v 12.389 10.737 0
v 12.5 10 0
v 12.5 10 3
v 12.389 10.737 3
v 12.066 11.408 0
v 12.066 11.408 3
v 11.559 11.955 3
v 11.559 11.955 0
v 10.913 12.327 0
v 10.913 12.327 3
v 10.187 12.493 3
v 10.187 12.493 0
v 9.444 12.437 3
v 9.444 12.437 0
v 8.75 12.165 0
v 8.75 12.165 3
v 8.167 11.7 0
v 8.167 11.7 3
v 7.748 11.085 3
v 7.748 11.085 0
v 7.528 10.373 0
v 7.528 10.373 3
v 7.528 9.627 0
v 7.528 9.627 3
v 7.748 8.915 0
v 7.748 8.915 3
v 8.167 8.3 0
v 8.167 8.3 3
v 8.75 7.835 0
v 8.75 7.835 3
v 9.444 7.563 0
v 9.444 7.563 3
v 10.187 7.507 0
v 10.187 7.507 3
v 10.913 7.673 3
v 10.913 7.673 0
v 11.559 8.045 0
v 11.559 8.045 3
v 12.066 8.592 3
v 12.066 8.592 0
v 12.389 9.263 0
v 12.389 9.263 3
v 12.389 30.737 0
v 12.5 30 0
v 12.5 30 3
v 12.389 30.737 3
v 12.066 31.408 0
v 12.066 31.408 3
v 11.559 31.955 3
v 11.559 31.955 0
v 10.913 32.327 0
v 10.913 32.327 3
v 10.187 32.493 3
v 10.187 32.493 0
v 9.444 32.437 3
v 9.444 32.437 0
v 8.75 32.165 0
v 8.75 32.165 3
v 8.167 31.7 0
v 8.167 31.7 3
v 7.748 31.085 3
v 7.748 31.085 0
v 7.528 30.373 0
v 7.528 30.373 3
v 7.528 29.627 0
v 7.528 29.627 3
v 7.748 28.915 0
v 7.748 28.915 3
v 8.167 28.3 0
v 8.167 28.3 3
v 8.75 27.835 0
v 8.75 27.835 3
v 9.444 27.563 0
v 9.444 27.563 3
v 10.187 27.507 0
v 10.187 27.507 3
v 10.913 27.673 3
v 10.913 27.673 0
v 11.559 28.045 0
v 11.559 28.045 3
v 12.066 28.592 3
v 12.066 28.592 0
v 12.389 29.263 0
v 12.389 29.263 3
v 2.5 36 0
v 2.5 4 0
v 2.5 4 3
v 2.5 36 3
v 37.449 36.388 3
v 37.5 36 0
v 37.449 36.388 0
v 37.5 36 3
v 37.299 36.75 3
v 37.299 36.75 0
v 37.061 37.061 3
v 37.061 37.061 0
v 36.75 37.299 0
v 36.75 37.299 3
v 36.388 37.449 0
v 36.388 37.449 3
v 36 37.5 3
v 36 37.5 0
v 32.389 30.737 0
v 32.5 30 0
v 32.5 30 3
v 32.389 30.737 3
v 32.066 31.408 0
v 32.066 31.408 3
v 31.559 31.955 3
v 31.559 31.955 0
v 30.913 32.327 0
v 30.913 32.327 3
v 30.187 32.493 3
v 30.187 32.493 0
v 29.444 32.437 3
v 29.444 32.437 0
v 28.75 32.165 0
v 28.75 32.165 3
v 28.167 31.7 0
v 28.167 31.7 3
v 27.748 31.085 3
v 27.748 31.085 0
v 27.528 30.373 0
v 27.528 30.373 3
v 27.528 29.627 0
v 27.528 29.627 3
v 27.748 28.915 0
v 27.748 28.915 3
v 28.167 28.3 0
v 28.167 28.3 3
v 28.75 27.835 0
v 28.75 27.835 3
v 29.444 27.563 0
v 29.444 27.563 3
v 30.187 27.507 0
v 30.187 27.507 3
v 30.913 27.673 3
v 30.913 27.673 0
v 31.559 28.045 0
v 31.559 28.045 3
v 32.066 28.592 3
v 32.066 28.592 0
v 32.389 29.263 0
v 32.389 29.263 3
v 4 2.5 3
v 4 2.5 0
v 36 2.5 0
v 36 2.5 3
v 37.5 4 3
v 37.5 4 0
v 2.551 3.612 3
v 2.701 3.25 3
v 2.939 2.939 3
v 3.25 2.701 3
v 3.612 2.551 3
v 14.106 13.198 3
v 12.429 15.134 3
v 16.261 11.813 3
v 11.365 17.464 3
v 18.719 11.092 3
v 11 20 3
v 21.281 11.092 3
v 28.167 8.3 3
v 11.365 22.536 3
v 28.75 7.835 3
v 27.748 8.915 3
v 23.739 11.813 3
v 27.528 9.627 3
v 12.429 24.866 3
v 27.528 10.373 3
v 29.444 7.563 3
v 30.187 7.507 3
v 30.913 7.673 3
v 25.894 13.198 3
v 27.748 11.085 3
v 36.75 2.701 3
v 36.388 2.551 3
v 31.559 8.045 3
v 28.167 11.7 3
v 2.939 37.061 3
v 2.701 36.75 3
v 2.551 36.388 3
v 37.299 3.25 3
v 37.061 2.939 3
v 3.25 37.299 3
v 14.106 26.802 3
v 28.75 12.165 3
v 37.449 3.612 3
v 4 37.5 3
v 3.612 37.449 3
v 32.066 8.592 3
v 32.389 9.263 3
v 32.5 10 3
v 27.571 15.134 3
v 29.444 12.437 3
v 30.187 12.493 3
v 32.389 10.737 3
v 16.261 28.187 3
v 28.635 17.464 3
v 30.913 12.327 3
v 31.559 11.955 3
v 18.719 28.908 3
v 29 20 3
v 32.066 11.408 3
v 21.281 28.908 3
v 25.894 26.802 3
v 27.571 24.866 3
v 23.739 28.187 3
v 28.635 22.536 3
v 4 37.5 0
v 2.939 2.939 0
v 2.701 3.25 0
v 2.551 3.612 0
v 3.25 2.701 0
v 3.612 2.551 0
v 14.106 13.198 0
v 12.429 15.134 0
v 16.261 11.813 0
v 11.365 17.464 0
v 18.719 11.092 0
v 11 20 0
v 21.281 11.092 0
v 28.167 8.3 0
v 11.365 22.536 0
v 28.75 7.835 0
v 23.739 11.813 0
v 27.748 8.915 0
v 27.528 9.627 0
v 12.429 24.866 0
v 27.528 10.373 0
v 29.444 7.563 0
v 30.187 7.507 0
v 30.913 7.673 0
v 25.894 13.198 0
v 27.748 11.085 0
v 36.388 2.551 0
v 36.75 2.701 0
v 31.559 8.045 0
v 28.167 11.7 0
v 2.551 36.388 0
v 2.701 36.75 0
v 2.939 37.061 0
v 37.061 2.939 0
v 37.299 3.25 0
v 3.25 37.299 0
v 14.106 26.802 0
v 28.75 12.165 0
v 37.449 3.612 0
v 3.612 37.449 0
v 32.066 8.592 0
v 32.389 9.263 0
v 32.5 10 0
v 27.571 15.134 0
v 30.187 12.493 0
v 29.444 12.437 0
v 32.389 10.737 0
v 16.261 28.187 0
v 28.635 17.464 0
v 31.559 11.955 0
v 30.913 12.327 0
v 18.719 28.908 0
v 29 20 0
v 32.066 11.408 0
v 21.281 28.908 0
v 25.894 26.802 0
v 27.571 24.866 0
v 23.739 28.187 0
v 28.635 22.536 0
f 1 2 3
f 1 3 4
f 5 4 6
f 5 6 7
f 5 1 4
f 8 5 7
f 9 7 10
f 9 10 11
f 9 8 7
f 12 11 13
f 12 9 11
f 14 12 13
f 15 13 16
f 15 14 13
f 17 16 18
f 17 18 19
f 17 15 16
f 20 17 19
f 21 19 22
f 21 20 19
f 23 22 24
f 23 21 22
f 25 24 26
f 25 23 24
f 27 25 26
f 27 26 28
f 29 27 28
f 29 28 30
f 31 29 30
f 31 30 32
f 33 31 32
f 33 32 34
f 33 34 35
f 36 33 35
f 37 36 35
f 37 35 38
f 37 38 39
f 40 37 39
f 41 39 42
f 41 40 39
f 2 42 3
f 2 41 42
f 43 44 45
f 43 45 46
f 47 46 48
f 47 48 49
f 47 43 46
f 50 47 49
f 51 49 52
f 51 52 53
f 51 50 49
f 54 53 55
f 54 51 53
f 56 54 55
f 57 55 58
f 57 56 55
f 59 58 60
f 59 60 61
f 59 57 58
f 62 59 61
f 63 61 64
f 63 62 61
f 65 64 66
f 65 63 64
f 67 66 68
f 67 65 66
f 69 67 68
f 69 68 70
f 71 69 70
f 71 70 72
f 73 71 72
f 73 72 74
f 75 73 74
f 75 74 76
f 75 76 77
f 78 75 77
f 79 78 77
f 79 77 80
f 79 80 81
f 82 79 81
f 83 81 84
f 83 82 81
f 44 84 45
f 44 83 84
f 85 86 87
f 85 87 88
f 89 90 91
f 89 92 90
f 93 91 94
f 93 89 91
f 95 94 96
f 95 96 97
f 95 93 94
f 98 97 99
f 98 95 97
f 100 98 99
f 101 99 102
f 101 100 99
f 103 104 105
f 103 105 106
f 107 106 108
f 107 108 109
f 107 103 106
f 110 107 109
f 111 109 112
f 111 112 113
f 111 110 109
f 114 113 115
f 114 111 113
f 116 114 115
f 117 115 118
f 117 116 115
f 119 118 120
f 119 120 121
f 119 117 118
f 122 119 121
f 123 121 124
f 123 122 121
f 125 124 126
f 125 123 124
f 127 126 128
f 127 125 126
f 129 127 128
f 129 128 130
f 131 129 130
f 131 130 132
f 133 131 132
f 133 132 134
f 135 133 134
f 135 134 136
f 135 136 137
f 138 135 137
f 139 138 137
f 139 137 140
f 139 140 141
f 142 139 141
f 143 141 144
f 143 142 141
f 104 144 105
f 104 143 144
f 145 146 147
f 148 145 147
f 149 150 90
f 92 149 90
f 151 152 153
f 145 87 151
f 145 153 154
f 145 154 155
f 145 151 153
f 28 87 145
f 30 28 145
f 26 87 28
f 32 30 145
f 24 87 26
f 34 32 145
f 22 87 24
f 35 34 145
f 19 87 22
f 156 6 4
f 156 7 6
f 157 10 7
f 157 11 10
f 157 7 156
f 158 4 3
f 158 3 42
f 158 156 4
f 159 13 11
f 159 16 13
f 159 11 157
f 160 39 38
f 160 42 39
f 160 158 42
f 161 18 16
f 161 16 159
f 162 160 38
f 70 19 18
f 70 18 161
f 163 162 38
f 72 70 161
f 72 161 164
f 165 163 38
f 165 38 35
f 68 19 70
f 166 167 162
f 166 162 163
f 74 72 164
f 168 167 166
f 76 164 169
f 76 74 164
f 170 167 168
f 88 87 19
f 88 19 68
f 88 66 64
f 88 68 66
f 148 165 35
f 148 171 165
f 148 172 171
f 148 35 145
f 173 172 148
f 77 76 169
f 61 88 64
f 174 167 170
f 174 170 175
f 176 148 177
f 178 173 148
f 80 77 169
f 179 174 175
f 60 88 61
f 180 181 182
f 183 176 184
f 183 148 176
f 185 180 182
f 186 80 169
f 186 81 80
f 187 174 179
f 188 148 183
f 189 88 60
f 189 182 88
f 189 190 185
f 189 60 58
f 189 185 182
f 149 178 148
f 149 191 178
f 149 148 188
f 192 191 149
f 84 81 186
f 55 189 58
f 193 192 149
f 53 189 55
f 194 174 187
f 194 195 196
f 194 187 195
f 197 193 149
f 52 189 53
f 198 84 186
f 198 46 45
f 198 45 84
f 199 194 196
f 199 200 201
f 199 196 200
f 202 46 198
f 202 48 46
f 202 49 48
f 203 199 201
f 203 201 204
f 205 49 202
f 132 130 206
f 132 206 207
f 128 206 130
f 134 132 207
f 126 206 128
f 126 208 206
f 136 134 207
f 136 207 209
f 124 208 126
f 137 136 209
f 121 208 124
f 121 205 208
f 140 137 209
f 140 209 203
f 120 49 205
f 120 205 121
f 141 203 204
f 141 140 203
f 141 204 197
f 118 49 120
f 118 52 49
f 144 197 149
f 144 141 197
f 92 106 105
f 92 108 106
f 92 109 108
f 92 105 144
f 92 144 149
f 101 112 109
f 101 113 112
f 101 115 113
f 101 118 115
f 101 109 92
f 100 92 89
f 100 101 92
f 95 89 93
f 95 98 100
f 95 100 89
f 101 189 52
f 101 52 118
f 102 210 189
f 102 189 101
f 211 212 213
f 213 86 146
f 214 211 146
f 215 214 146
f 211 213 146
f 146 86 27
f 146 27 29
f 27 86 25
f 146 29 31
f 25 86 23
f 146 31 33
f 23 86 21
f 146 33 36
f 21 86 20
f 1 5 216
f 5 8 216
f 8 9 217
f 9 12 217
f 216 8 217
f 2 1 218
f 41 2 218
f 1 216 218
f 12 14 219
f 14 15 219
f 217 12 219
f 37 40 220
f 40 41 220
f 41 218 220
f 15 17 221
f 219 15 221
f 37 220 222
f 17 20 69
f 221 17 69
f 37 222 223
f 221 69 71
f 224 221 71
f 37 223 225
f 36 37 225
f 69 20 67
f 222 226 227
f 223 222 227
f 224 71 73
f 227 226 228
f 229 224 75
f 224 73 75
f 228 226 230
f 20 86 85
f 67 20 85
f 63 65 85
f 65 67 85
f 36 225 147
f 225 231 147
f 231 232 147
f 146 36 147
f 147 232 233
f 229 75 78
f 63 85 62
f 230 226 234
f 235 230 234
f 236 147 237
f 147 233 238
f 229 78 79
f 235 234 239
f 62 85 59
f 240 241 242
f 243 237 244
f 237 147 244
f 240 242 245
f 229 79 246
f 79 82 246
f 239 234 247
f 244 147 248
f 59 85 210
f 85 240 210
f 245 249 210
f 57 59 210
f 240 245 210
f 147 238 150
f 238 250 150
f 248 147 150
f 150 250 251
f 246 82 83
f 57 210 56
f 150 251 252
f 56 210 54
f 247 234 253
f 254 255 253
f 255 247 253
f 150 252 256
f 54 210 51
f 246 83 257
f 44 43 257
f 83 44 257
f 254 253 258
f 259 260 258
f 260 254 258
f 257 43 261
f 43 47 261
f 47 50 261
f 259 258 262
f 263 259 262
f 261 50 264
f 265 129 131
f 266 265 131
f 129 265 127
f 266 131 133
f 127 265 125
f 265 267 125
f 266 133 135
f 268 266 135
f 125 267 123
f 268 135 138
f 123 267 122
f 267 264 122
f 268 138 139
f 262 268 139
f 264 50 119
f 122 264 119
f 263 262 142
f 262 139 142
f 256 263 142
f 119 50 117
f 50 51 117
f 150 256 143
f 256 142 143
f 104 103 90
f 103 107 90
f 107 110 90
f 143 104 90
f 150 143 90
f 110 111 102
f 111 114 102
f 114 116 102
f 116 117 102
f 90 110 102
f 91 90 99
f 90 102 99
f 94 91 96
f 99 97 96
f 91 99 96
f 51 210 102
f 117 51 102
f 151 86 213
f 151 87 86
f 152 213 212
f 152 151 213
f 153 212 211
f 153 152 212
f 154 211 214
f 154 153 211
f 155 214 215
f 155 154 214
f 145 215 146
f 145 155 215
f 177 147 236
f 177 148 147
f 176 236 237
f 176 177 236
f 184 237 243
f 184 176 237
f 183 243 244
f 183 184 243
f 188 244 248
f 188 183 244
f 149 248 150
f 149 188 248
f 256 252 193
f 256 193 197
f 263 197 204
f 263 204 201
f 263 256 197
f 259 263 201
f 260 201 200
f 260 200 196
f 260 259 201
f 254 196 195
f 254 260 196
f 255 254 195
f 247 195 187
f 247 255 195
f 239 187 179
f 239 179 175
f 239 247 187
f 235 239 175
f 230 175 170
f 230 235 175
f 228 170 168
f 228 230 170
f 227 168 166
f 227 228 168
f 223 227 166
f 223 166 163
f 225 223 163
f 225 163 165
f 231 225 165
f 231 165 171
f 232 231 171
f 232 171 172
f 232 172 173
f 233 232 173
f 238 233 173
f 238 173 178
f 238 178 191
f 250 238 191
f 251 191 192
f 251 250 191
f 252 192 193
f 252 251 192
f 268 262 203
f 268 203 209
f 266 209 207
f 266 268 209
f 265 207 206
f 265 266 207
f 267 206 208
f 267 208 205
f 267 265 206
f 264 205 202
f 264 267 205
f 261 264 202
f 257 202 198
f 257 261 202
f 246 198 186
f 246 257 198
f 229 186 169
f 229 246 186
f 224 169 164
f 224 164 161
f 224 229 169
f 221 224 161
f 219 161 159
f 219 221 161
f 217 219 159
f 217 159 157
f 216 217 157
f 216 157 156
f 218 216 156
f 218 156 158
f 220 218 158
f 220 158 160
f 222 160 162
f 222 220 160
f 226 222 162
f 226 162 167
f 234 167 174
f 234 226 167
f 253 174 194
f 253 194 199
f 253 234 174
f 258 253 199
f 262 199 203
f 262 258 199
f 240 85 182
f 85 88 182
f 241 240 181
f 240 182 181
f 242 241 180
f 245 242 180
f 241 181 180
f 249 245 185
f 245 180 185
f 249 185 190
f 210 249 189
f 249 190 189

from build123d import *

# Parameters (mm, degrees)
CYLINDER002_R     = 2.5
CYLINDER002_DEPTH = 3
CYLINDER001_R     = 9
CYLINDER001_DEPTH = 3
CYLINDER003_R     = 2.5
CYLINDER003_DEPTH = 3
CYLINDER004_R     = 2.5
CYLINDER004_DEPTH = 3
CYLINDER005_R     = 2.5
CYLINDER005_DEPTH = 3
BOX002_W          = 35
BOX002_H          = 35
BOX002_DEPTH      = 3
FILLET002_R       = 1.5


with BuildPart() as cylinder002:
    # Cylinder002 → Cylinder002 (new body)
    with BuildSketch(Plane(origin=(10, 10, 0), x_dir=(1, 0, 0), z_dir=(0, 0, 1))):
        Circle(CYLINDER002_R)
    extrude(amount=CYLINDER002_DEPTH)


with BuildPart() as cylinder001:
    # Cylinder001 → Cylinder001 (new body)
    with BuildSketch(Plane(origin=(20, 20, 0), x_dir=(1, 0, 0), z_dir=(0, 0, 1))):
        Circle(CYLINDER001_R)
    extrude(amount=CYLINDER001_DEPTH)


with BuildPart() as cylinder003:
    # Cylinder003 → Cylinder003 (new body)
    with BuildSketch(Plane(origin=(30, 10, 0), x_dir=(1, 0, 0), z_dir=(0, 0, 1))):
        Circle(CYLINDER003_R)
    extrude(amount=CYLINDER003_DEPTH)


with BuildPart() as cylinder004:
    # Cylinder004 → Cylinder004 (new body)
    with BuildSketch(Plane(origin=(10, 30, 0), x_dir=(1, 0, 0), z_dir=(0, 0, 1))):
        Circle(CYLINDER004_R)
    extrude(amount=CYLINDER004_DEPTH)


with BuildPart() as cylinder005:
    # Cylinder005 → Cylinder005 (new body)
    with BuildSketch(Plane(origin=(30, 30, 0), x_dir=(1, 0, 0), z_dir=(0, 0, 1))):
        Circle(CYLINDER005_R)
    extrude(amount=CYLINDER005_DEPTH)


with BuildPart() as cut006:
    # Box002 → Box002 (new body)
    with BuildSketch(Plane(origin=(2.5, 2.5, 0), x_dir=(1, 0, 0), z_dir=(0, 0, 1))):
        with Locations((17.5, 17.5)):
            Rectangle(BOX002_W, BOX002_H)
    extrude(amount=BOX002_DEPTH)

    # Fillet002
    fillet002_edges = [cut006.edges().sort_by_distance(p)[0] for p in [
        (2.5, 2.5, 1.5),
        (2.5, 37.5, 1.5),
        (37.5, 2.5, 1.5),
        (37.5, 37.5, 1.5),
    ]]
    fillet(fillet002_edges, radius=FILLET002_R)

    # Cut002: cut Cylinder005
    add(cylinder005.part, mode=Mode.SUBTRACT)

    # Cut003: cut Cylinder004
    add(cylinder004.part, mode=Mode.SUBTRACT)

    # Cut004: cut Cylinder003
    add(cylinder003.part, mode=Mode.SUBTRACT)

    # Cut005: cut Cylinder001
    add(cylinder001.part, mode=Mode.SUBTRACT)

    # Cut006: cut Cylinder002
    add(cylinder002.part, mode=Mode.SUBTRACT)


solid = cut006.part
